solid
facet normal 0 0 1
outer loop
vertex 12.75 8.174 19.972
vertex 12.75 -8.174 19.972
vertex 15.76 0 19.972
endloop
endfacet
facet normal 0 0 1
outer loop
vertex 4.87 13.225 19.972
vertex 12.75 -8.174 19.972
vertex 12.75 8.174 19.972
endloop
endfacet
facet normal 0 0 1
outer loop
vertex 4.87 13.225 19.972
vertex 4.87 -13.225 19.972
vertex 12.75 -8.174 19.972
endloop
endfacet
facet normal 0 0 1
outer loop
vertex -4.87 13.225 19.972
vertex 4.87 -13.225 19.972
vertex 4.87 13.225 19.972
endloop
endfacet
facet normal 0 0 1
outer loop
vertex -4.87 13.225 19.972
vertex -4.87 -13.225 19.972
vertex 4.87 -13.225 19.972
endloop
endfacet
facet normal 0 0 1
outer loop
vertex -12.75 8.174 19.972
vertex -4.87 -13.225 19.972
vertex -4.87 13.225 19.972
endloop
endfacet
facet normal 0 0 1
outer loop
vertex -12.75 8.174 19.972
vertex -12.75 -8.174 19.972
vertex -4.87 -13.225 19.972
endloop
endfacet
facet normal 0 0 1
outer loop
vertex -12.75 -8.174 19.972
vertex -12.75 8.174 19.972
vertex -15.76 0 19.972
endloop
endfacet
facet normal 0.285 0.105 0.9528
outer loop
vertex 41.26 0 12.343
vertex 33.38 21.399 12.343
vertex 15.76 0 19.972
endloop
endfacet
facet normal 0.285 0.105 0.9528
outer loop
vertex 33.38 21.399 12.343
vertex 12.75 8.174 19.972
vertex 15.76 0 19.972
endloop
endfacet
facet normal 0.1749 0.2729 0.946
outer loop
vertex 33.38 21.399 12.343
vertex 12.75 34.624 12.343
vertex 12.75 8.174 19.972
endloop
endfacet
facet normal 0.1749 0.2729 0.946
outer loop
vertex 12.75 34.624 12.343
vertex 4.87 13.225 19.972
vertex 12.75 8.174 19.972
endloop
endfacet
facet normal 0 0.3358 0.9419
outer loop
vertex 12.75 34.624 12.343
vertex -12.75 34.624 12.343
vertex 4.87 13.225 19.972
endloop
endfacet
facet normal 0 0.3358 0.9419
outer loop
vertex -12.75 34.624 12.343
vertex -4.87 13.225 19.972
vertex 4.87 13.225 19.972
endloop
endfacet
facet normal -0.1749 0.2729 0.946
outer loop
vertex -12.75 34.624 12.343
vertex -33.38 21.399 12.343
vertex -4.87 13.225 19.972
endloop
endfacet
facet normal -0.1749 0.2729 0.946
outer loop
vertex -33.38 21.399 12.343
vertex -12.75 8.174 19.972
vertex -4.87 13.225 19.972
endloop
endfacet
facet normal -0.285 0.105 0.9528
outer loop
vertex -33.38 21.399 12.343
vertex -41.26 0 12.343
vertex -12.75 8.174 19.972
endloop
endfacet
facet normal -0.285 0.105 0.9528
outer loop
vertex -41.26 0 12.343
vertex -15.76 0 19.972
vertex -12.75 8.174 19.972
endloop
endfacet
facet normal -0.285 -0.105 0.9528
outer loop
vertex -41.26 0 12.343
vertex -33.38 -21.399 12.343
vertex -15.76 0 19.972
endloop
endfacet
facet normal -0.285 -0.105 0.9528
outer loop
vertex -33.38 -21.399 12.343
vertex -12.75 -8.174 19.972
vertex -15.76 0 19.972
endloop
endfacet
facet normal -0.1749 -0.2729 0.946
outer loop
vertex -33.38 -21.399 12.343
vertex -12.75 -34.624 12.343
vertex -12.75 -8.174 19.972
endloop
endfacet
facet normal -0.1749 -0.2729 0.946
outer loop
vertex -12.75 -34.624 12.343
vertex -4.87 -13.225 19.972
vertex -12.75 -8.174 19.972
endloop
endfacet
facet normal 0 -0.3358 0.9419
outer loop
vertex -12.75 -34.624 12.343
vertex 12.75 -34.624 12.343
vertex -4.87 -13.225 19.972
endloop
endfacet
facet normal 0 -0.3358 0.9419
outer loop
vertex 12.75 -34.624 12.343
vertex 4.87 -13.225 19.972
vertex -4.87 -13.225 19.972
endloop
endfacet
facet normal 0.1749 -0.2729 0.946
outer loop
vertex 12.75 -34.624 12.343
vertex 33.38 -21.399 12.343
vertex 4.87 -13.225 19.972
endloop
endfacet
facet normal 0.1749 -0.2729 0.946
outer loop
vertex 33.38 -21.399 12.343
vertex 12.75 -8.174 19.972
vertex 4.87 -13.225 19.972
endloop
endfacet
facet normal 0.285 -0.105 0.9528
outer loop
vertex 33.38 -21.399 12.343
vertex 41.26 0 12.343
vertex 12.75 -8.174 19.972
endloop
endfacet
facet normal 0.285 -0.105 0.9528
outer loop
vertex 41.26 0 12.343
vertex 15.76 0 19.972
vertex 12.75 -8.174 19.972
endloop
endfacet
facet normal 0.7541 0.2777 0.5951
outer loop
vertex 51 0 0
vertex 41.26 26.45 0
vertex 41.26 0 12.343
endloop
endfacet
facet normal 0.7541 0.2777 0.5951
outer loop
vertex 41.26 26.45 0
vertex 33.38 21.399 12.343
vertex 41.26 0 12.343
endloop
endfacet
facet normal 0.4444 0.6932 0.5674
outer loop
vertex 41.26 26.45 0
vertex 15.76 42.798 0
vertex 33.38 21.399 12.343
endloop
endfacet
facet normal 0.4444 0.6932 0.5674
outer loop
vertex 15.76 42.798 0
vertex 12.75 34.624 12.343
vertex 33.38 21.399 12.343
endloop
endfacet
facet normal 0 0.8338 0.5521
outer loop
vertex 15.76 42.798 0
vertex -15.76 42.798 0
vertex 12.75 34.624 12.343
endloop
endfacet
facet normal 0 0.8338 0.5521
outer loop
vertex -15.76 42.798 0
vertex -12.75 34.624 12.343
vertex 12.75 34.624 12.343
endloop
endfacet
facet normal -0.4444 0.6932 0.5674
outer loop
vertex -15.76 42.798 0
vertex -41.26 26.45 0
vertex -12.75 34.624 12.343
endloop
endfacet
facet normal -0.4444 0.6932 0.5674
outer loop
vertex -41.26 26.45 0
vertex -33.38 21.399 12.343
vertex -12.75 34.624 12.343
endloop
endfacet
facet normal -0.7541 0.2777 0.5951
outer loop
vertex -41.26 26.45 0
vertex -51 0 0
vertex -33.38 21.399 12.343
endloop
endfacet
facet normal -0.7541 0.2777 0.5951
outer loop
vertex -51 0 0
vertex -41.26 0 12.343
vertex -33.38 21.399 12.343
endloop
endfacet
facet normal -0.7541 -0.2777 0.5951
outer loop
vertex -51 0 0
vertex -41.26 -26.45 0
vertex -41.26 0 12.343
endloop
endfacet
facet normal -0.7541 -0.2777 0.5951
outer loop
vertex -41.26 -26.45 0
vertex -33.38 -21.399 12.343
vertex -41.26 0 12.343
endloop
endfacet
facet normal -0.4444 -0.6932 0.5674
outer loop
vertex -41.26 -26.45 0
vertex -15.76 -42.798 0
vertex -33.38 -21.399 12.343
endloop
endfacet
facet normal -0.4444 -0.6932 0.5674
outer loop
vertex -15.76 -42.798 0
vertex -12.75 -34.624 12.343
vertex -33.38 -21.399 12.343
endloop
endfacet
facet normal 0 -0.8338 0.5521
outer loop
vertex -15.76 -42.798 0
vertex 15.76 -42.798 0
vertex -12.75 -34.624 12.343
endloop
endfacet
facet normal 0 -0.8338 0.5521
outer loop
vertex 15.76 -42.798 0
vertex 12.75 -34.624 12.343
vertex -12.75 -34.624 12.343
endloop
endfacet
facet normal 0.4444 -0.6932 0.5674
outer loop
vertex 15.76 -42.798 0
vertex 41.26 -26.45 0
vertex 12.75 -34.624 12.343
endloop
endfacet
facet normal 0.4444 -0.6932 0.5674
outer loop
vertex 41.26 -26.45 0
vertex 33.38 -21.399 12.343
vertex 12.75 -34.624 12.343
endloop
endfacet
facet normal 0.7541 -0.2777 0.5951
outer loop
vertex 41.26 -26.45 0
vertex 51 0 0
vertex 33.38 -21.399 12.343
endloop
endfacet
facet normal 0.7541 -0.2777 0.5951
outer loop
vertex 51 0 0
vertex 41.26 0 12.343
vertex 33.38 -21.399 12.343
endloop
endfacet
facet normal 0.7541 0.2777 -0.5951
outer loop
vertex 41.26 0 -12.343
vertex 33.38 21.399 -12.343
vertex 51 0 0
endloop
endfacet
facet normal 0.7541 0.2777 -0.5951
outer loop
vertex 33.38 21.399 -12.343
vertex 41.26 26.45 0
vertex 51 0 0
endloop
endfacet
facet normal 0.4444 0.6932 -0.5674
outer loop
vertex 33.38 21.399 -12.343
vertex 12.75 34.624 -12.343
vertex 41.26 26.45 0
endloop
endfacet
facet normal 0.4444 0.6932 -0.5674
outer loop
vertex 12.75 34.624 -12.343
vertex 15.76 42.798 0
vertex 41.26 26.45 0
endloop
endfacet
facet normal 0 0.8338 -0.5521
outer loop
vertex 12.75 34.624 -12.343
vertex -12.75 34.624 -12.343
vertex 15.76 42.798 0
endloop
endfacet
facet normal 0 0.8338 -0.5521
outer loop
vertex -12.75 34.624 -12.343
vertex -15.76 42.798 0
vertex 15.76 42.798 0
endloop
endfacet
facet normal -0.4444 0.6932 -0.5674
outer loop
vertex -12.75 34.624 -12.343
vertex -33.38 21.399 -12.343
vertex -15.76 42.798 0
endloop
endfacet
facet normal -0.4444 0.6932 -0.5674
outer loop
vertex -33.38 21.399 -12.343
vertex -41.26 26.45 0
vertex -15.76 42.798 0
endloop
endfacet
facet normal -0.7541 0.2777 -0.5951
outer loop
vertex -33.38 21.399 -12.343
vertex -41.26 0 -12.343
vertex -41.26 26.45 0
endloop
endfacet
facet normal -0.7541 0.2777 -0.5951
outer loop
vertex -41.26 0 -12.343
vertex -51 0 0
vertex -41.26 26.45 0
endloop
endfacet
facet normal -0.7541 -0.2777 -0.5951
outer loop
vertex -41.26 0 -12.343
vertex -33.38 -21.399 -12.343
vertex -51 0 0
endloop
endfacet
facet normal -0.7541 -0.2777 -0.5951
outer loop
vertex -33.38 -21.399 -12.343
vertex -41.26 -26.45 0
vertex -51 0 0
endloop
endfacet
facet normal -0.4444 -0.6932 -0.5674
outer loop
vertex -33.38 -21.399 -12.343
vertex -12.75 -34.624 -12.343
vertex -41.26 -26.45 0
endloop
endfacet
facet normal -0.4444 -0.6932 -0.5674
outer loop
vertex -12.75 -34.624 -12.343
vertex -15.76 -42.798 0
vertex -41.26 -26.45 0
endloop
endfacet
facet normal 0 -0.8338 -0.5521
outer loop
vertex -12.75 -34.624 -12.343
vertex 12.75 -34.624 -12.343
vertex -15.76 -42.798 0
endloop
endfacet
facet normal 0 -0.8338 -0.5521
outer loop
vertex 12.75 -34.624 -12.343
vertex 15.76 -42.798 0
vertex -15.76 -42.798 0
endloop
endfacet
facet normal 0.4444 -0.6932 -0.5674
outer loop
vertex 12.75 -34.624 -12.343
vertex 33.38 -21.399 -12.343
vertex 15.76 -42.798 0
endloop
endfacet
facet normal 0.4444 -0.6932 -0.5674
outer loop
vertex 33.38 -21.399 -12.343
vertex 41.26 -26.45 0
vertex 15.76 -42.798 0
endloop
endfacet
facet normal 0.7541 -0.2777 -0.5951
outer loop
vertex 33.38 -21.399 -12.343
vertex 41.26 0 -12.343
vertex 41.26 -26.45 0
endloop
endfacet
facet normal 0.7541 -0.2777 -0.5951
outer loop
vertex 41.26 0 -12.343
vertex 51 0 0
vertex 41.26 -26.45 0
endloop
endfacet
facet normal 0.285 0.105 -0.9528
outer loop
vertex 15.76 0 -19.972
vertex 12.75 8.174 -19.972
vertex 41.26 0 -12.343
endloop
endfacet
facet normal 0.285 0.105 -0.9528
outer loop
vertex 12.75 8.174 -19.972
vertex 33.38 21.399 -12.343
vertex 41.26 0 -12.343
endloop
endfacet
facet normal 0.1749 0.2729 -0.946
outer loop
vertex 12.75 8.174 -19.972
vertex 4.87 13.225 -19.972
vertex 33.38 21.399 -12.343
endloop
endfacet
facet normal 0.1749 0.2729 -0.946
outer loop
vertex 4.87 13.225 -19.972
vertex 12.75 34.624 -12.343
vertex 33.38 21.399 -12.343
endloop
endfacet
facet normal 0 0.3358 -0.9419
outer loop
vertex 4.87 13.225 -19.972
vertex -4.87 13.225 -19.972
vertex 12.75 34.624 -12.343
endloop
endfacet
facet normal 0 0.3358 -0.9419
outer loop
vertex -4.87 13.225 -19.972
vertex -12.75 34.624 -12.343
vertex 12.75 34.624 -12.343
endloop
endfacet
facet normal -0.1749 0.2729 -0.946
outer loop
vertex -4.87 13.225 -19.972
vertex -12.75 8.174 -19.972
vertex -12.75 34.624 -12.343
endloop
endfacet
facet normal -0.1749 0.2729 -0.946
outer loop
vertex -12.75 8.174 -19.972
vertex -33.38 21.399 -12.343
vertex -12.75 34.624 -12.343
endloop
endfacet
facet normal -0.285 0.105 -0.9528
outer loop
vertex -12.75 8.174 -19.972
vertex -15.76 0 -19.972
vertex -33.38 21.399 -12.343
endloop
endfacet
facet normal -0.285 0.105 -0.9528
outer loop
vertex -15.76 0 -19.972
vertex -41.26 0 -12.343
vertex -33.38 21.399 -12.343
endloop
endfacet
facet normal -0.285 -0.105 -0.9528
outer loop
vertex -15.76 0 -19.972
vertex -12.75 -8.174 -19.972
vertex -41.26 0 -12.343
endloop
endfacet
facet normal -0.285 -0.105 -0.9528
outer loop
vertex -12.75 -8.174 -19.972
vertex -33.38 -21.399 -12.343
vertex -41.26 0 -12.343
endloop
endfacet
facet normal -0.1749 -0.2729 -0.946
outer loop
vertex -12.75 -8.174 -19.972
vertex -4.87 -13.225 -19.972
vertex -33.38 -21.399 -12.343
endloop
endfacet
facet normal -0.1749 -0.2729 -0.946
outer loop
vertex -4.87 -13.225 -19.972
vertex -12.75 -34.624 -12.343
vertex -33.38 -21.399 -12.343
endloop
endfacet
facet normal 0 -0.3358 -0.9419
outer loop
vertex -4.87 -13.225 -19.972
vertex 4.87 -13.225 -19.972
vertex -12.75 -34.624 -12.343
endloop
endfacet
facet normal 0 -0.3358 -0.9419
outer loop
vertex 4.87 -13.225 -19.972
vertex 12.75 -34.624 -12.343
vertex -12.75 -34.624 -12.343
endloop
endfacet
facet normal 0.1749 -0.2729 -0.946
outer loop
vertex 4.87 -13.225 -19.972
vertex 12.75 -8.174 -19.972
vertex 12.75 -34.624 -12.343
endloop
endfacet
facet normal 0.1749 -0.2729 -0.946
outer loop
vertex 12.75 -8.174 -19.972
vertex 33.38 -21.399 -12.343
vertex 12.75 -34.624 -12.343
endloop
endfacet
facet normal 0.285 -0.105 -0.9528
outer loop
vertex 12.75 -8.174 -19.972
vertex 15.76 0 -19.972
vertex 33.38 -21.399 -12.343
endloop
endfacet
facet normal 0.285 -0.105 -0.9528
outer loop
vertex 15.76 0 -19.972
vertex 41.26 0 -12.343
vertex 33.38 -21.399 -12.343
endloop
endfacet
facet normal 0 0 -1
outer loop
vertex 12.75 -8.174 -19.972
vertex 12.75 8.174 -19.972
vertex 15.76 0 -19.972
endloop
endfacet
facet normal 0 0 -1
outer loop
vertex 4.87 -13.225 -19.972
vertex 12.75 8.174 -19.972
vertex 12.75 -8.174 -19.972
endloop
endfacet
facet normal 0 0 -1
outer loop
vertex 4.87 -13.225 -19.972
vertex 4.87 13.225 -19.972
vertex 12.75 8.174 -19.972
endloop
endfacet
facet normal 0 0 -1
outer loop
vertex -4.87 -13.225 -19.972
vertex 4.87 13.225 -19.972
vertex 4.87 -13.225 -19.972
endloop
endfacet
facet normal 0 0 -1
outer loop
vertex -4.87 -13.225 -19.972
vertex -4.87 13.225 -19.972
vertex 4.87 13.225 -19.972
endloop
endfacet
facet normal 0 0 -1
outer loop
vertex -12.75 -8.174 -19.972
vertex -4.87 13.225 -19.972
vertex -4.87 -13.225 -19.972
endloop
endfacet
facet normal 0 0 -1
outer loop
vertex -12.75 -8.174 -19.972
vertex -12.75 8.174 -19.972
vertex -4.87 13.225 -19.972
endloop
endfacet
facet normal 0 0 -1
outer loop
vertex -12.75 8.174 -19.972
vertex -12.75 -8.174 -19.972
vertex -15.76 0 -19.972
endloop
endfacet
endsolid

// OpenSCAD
// Generated by SolidPython 1.0.1 on 2020-07-29 00:46:53


scale(v = [17, 15, 7]) {
	sphere(r = 3);
}
/***********************************************
*********      SolidPython code:      **********
************************************************
 
# import packages: SolidPython
from solid import *
from solid.utils import *
from itertools import chain, combinations, permutations


class Resize:

    def __init__(self, scad_file):
        self.scad_file = scad_file
        #self.scad_file = import_scad(scad_file)
        # cone/cylinder param:
        self.r1 = 0
        self.r2 = 0
        self.h = 0
        # rectangular prism param:
        self.w = 0
        self.l = 0
        # ellipse param:
        self.r = 0

    # import OpenScad code (file name corresponds to shape)


    # classify shape + parameters
    def assign(self, param1, param2, param3):
        if self.scad_file == 'cone.scad':
            self.r1 = param1
            self.r2 = param2
            self.h = param3
        elif self.scad_file == 'cylinder.scad':
            self.r1 = param1
            self.r2 = param2
            self.h = param3
        elif self.scad_file == 'rectangularPrism.scad':
            self.h = param1
            self.l = param2
            self.w = param3
        else:
            self.r = param1
            self.h = param2

    # resize parameters
    def iterate(self):
        x = range(3, 20, 2)
        i = 1
        if self.scad_file == 'cone.scad':
            tempList = list(permutations(x, 2))
            for temp in tempList:
                param1 = temp[0]
                param2 = temp[1]
                filepath = 'produced_scad_files/' + 'cone' + str(param1) + '_' + str(param2) + '_' + '.scad'
                scad_render_to_file(cylinder(h=param1, r1=param2, r2=0), filepath)

        elif self.scad_file == 'cylinder.scad':
            tempList = list(permutations(x, 3))
            for temp in tempList:
                param1 = temp[0]
                param2 = temp[1]
                filepath = 'produced_scad_files/' + 'cylinder' + str(param1) + '_' + str(param2) + '_' + '.scad'
                scad_render_to_file(cylinder(h=param1, r1=param2, r2=param2), filepath)

        elif self.scad_file == 'rectangularPrism.scad':
            tempList = list(permutations(x, 3))
            for temp in tempList:
                param1 = temp[0]
                param2 = temp[1]
                param3 = temp[2]
                filepath = 'produced_scad_files/' + 'rectangularPrism' + str(param1) + '_' + str(param2) + '_' + str(
                    param3) + '.scad'
                scad_render_to_file(cube(size=(param1, param2, param3)), filepath)

        elif self.scad_file == 'ellipse.scad':
            tempList = list(permutations(x, 4))
            for temp in tempList:
                param1 = temp[0]
                param2 = temp[1]
                param3 = temp[2]
                param4 = temp[3]
                filepath = 'produced_scad_files/' + 'ellipse' + str(param1) + '_' + str(param2) + '_' + str(param3) + '_' + str(param4) + '.scad'
                scad_render_to_file(scale([param1, param2, param3])(sphere(r=param4)), filepath)

    def render_to_scadfile(self):
        scad_render_to_file(scad, 'example.scad') 
 
************************************************/
